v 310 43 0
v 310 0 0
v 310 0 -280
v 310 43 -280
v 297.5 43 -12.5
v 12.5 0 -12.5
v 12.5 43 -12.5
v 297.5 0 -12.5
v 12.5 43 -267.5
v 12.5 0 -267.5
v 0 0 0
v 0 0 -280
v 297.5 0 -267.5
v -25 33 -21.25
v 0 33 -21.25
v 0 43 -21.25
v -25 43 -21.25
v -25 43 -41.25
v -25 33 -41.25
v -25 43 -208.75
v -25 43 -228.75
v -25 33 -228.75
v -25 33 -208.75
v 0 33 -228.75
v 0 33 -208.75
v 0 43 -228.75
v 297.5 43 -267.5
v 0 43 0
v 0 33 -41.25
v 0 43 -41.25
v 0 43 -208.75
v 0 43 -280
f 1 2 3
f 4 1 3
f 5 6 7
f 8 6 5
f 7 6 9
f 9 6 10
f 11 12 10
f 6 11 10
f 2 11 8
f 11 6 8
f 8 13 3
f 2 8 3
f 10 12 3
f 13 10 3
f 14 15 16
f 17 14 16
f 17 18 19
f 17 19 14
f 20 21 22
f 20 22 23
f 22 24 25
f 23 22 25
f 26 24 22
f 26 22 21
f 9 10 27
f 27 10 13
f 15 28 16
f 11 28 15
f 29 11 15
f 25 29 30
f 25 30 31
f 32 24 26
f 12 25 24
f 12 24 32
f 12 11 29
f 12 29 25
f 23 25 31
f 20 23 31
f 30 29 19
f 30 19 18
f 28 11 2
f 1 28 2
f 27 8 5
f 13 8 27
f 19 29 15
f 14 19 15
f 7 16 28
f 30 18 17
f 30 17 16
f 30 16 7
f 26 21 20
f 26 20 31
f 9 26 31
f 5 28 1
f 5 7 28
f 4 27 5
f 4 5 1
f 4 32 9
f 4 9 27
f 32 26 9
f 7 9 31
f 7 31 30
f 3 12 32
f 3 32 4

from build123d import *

# Parameters (mm, degrees)
SKETCH1_W           = 310
SKETCH1_H           = 280
SKETCH1_W_2         = 285
SKETCH1_H_2         = 255
BOSS_EXTRUDE1_DEPTH = 43
SKETCH2_W           = 20
SKETCH2_H           = 10
BOSS_EXTRUDE2_DEPTH = 25


with BuildPart() as part:
    # Sketch1 → Boss-Extrude1 (new body)
    with BuildSketch(Plane(origin=(0, 0, 0), x_dir=(1, 0, 0), z_dir=(0, 1, 0))):
        with Locations((155, 140)):
            Rectangle(SKETCH1_W, SKETCH1_H)
        with Locations((155, 140)):
            Rectangle(SKETCH1_W_2, SKETCH1_H_2, mode=Mode.SUBTRACT)
    extrude(amount=BOSS_EXTRUDE1_DEPTH)

    # Sketch2 → Boss-Extrude2 (add)
    with BuildSketch(Plane.ZY):
        with Locations((-218.75, 38)):
            Rectangle(SKETCH2_W, SKETCH2_H)
        with Locations((-31.25, 38)):
            Rectangle(SKETCH2_W, SKETCH2_H)
    extrude(amount=BOSS_EXTRUDE2_DEPTH)


solid = part.part
